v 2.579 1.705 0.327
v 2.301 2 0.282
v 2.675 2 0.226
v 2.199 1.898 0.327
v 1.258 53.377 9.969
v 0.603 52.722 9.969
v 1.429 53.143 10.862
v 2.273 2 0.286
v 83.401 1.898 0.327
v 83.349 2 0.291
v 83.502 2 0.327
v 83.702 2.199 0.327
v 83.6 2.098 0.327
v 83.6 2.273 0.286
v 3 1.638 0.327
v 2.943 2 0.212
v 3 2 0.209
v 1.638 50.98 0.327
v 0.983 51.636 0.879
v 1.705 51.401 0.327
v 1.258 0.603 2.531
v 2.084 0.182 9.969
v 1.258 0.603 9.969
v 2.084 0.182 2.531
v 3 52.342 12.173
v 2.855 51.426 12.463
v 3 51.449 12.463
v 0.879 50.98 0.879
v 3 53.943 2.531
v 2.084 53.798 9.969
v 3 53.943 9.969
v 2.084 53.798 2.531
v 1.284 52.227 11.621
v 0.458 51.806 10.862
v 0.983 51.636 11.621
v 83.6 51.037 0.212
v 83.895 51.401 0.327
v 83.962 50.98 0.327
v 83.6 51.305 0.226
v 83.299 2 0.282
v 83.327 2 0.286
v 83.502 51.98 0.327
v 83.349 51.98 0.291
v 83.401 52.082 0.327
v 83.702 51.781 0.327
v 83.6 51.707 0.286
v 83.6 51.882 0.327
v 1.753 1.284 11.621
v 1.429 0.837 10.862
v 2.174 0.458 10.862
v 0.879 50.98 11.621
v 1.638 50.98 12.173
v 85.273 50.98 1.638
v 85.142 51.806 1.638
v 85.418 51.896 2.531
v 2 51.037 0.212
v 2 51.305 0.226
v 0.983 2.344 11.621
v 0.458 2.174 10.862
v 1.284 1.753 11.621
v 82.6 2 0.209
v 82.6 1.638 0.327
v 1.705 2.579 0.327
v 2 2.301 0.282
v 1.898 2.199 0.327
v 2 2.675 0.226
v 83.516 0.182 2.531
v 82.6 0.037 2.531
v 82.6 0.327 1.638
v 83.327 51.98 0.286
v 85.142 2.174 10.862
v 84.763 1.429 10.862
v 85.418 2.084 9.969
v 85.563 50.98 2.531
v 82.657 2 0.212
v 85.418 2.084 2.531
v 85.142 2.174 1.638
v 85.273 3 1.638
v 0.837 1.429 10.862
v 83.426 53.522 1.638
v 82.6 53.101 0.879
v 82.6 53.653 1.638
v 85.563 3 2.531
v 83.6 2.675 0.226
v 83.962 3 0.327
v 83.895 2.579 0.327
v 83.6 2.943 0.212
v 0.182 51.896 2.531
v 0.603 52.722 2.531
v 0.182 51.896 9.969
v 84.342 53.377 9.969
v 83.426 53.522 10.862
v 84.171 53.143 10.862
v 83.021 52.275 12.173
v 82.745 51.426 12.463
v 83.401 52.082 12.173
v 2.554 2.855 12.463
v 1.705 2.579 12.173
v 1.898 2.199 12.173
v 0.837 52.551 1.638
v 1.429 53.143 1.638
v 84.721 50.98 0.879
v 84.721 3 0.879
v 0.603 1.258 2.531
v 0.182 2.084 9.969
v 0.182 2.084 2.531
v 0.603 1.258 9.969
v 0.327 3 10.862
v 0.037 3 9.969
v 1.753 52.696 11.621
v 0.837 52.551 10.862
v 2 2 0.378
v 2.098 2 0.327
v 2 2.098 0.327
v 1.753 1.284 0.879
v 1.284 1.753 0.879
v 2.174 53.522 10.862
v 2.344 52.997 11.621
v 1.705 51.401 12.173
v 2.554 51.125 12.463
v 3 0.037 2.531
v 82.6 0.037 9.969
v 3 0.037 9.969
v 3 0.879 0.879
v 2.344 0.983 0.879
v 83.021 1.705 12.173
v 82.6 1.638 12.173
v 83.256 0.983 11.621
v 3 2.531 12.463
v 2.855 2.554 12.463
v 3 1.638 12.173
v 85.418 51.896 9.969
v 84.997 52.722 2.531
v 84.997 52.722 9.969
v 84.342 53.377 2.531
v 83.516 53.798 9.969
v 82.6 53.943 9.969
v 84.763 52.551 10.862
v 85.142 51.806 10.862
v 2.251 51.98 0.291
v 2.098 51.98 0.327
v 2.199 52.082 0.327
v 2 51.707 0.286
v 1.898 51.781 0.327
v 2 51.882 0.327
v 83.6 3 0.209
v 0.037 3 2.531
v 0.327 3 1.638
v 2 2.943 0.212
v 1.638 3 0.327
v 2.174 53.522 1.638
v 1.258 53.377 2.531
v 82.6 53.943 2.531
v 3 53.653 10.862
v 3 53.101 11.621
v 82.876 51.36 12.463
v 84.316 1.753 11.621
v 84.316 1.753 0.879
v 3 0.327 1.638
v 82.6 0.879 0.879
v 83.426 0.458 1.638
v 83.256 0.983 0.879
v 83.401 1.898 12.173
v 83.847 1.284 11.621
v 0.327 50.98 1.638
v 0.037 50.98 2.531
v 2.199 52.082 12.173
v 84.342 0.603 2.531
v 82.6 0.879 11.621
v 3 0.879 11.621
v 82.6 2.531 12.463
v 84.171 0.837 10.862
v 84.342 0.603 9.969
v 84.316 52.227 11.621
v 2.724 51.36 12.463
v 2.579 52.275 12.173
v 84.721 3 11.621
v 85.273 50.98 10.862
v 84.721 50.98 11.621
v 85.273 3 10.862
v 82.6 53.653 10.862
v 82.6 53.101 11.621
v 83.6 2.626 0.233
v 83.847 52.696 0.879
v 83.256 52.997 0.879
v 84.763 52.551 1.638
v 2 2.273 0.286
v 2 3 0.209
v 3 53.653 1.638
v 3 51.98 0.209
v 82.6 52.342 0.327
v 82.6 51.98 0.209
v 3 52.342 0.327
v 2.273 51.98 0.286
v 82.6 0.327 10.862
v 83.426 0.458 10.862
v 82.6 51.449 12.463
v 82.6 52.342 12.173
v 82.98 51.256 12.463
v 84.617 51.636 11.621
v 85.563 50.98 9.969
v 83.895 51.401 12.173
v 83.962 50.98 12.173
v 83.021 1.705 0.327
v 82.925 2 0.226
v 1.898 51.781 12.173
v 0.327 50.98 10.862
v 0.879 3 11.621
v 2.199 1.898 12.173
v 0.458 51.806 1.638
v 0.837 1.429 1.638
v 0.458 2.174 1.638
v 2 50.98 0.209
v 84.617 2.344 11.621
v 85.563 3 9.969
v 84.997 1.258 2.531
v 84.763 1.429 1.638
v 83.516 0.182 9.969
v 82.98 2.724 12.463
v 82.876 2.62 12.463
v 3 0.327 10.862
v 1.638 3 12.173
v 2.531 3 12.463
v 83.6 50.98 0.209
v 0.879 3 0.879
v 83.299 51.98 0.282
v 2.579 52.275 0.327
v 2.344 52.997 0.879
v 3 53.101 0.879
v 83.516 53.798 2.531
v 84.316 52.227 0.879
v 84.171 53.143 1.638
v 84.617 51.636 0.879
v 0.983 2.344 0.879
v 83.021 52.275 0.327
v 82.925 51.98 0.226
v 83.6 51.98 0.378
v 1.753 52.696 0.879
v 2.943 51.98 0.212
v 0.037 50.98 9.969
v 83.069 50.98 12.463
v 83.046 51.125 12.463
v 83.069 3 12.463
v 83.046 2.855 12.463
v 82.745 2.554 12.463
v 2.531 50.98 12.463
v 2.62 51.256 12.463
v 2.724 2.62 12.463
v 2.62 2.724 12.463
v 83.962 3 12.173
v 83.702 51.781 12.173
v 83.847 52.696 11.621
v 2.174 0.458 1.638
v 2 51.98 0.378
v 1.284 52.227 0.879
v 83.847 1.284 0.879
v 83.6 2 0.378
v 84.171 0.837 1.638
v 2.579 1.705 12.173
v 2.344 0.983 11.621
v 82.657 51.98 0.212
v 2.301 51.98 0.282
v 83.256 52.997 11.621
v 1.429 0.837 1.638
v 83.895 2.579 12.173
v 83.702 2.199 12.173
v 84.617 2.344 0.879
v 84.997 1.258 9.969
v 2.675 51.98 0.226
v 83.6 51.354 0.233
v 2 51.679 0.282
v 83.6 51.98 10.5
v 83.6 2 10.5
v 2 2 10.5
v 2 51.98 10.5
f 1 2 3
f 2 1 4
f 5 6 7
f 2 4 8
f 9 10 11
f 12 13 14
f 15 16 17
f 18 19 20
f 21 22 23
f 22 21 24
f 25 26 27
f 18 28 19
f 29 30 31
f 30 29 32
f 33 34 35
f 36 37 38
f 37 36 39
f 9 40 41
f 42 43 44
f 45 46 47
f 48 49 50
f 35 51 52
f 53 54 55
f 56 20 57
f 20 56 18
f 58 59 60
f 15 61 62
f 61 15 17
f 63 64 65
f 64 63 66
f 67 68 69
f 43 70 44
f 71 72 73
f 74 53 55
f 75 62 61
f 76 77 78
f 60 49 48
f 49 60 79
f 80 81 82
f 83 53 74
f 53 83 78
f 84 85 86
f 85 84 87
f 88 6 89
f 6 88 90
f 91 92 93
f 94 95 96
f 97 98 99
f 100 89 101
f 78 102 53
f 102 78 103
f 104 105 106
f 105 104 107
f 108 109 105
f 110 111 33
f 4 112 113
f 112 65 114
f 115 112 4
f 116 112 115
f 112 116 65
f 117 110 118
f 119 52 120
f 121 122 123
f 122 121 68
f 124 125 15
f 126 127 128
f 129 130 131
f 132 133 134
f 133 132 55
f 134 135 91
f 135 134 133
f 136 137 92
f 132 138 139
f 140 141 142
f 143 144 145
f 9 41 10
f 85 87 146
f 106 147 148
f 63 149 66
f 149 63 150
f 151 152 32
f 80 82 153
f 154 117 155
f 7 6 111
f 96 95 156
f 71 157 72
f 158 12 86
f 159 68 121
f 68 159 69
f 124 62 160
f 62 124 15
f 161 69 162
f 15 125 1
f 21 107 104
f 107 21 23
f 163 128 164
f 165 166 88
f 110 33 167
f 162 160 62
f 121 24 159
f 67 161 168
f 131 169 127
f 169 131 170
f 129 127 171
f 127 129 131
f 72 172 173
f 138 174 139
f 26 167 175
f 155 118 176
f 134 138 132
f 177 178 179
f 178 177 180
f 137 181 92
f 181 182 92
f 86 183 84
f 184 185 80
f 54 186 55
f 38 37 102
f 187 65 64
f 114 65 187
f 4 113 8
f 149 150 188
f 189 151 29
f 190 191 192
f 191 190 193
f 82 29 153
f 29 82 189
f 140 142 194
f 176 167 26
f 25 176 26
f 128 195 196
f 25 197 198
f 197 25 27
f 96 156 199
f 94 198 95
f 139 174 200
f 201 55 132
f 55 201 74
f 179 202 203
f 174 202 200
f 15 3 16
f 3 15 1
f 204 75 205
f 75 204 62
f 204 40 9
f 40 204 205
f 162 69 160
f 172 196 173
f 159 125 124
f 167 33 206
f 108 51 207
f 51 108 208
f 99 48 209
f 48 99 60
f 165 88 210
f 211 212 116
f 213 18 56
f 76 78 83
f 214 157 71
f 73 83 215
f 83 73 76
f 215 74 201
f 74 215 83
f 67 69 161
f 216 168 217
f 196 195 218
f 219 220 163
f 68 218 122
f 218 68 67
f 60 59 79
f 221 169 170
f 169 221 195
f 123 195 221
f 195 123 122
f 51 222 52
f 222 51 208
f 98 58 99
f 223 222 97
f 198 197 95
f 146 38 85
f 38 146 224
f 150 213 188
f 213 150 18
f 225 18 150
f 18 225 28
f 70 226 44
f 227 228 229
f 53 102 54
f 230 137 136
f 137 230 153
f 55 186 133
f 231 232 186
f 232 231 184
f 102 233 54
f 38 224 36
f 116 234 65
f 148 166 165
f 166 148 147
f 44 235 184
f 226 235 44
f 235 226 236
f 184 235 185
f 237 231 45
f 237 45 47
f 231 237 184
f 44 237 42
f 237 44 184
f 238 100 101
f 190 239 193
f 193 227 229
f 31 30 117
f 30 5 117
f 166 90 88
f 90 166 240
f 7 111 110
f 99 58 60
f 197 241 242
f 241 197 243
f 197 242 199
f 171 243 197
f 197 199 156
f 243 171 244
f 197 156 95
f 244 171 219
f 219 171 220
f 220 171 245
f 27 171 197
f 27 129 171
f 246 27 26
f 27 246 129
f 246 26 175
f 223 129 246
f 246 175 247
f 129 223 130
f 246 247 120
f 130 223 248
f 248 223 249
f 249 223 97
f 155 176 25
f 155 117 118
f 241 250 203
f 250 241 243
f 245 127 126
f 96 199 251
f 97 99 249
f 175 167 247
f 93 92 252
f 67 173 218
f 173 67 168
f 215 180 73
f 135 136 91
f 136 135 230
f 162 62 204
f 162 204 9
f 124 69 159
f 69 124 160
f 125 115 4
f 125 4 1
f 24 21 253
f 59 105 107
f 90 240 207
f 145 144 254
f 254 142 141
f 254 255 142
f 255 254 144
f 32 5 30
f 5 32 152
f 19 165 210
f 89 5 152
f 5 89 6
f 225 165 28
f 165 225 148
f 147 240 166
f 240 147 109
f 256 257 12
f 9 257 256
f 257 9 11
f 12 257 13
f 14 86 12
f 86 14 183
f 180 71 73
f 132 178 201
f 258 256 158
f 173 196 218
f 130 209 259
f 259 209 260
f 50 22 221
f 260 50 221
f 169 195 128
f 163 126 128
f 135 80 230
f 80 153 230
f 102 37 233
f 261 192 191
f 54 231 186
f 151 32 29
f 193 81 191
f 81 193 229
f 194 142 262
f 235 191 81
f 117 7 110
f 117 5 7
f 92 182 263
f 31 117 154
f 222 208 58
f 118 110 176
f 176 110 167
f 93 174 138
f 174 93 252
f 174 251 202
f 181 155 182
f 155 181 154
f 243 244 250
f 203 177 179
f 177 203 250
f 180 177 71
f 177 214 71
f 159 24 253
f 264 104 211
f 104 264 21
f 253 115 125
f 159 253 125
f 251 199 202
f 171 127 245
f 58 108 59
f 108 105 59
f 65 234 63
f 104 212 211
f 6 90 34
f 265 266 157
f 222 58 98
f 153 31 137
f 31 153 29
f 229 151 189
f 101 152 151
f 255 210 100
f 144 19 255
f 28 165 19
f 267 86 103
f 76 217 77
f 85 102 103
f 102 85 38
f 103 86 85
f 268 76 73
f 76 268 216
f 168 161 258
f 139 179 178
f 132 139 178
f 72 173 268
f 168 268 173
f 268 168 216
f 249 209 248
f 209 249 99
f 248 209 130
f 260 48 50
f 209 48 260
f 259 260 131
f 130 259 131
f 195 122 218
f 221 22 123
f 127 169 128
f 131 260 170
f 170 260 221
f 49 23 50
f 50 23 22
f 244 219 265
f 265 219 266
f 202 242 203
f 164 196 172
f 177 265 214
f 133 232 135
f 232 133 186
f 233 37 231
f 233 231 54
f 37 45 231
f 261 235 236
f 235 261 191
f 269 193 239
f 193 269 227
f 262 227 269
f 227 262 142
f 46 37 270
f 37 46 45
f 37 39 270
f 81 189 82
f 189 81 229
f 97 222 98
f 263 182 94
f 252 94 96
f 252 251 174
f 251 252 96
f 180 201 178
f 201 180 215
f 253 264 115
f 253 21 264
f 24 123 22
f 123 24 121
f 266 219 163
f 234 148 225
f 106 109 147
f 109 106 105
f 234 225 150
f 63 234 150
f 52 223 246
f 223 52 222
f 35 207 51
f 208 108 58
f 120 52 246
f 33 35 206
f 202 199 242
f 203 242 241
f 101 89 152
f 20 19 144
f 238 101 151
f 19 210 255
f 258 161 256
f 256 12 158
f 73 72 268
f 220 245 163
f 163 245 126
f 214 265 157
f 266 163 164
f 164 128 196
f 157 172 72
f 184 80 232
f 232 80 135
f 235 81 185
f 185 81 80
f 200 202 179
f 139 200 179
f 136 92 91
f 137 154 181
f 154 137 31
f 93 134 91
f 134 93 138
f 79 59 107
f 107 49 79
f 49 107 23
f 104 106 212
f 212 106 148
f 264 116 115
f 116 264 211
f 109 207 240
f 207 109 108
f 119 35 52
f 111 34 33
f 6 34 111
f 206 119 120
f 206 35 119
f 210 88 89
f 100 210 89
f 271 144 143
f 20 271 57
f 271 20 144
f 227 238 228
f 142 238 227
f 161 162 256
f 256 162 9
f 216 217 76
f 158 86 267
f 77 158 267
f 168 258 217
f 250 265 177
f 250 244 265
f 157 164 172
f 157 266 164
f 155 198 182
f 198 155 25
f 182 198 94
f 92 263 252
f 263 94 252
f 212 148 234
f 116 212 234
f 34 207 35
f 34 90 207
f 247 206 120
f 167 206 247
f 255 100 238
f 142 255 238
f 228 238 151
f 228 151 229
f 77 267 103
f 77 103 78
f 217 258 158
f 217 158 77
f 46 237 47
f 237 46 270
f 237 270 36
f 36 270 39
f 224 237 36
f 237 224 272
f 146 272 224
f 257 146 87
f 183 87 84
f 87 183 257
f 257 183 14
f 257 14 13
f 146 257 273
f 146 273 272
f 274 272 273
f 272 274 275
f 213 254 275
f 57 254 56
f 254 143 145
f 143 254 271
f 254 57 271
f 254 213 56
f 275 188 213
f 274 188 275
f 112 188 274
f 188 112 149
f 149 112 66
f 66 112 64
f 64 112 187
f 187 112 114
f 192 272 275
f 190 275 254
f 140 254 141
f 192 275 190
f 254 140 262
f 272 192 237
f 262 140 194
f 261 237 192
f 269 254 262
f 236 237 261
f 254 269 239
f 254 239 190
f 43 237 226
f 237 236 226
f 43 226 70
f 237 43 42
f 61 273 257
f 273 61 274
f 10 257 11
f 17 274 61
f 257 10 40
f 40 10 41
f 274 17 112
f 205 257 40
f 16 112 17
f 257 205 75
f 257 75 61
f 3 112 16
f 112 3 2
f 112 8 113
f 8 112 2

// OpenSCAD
// PwnZero Case - OpenSCAD Model
// 圆角外壳设计，适配 Pi Zero 2W + 扩展板

// ============================================
// 参数设置
// ============================================

// 外壳尺寸 (信用卡尺寸)
case_length = 85.6;
case_width = 53.98;
case_height = 25;
wall_thickness = 2;
corner_radius = 3;

// 曲面面板参数
panel_thickness = 2;  // 亚克力/滴胶厚度
panel_curve_radius = 150;  // 曲面半径 (越大越平)

// Pi Zero 尺寸
pi_length = 65;
pi_width = 30;

// OLED 开孔
oled_width = 32;
oled_height = 16;
oled_x = 10;
oled_y = 8;

// 五向按键开孔
button_diameter = 12;
button_x = 60;
button_y = case_width / 2;

// LED 开孔
led_diameter = 5.5;
led_spacing = 8;
led_x = 45;
led_y = 5;

// USB 开孔
usb_width = 12;
usb_height = 6;

// 天线孔
antenna_diameter = 6;

// PCB 尺寸
pcb_length = 85.6;
pcb_width = 53.98;
pcb_thickness = 1.6;
pcb_clearance = 1;  // PCB与外壳的间隙

// 安装柱参数
mount_post_diameter = 4;
mount_post_height = 8;
mount_screw_diameter = 2.5;

// 卡扣参数
clip_width = 3;
clip_height = 2;
clip_depth = 1;

// ============================================
// 圆角立方体模块
// ============================================
module rounded_cube(size, radius) {
    hull() {
        for (x = [radius, size[0] - radius])
            for (y = [radius, size[1] - radius])
                for (z = [radius, size[2] - radius])
                    translate([x, y, z])
                        sphere(r = radius, $fn = 20);
    }
}

// ============================================
// 底壳模块
// ============================================
module bottom_case() {
    difference() {
        // 外壳主体
        rounded_cube([case_length, case_width, case_height/2], corner_radius);

        // 内部挖空
        translate([wall_thickness, wall_thickness, wall_thickness])
            cube([case_length - wall_thickness*2,
                  case_width - wall_thickness*2,
                  case_height]);
    }
}

// ============================================
// 顶盖模块
// ============================================
module top_case() {
    difference() {
        // 顶盖主体
        rounded_cube([case_length, case_width, case_height/2], corner_radius);

        // 内部挖空
        translate([wall_thickness, wall_thickness, -1])
            cube([case_length - wall_thickness*2,
                  case_width - wall_thickness*2,
                  case_height/2 - wall_thickness + 1]);

        // OLED 开孔
        translate([oled_x, oled_y, -1])
            cube([oled_width, oled_height, wall_thickness + 2]);

        // 五向按键开孔
        translate([button_x, button_y, -1])
            cylinder(h = wall_thickness + 2, d = button_diameter, $fn = 30);

        // LED 开孔 x3
        for (i = [0:2]) {
            translate([led_x + i * led_spacing, led_y, -1])
                cylinder(h = wall_thickness + 2, d = led_diameter, $fn = 20);
        }
    }
}

// ============================================
// 按键帽模块
// ============================================
module button_cap() {
    difference() {
        cylinder(h = 5, d1 = 10, d2 = 8, $fn = 30);
        translate([0, 0, -1])
            cylinder(h = 3, d = 6, $fn = 30);
    }
}

// ============================================
// 渲染选择
// ============================================
// 取消注释来渲染不同部件

// 底壳
// bottom_case();

// 顶盖
top_case();

// 按键帽
// translate([0, 70, 0]) button_cap();
